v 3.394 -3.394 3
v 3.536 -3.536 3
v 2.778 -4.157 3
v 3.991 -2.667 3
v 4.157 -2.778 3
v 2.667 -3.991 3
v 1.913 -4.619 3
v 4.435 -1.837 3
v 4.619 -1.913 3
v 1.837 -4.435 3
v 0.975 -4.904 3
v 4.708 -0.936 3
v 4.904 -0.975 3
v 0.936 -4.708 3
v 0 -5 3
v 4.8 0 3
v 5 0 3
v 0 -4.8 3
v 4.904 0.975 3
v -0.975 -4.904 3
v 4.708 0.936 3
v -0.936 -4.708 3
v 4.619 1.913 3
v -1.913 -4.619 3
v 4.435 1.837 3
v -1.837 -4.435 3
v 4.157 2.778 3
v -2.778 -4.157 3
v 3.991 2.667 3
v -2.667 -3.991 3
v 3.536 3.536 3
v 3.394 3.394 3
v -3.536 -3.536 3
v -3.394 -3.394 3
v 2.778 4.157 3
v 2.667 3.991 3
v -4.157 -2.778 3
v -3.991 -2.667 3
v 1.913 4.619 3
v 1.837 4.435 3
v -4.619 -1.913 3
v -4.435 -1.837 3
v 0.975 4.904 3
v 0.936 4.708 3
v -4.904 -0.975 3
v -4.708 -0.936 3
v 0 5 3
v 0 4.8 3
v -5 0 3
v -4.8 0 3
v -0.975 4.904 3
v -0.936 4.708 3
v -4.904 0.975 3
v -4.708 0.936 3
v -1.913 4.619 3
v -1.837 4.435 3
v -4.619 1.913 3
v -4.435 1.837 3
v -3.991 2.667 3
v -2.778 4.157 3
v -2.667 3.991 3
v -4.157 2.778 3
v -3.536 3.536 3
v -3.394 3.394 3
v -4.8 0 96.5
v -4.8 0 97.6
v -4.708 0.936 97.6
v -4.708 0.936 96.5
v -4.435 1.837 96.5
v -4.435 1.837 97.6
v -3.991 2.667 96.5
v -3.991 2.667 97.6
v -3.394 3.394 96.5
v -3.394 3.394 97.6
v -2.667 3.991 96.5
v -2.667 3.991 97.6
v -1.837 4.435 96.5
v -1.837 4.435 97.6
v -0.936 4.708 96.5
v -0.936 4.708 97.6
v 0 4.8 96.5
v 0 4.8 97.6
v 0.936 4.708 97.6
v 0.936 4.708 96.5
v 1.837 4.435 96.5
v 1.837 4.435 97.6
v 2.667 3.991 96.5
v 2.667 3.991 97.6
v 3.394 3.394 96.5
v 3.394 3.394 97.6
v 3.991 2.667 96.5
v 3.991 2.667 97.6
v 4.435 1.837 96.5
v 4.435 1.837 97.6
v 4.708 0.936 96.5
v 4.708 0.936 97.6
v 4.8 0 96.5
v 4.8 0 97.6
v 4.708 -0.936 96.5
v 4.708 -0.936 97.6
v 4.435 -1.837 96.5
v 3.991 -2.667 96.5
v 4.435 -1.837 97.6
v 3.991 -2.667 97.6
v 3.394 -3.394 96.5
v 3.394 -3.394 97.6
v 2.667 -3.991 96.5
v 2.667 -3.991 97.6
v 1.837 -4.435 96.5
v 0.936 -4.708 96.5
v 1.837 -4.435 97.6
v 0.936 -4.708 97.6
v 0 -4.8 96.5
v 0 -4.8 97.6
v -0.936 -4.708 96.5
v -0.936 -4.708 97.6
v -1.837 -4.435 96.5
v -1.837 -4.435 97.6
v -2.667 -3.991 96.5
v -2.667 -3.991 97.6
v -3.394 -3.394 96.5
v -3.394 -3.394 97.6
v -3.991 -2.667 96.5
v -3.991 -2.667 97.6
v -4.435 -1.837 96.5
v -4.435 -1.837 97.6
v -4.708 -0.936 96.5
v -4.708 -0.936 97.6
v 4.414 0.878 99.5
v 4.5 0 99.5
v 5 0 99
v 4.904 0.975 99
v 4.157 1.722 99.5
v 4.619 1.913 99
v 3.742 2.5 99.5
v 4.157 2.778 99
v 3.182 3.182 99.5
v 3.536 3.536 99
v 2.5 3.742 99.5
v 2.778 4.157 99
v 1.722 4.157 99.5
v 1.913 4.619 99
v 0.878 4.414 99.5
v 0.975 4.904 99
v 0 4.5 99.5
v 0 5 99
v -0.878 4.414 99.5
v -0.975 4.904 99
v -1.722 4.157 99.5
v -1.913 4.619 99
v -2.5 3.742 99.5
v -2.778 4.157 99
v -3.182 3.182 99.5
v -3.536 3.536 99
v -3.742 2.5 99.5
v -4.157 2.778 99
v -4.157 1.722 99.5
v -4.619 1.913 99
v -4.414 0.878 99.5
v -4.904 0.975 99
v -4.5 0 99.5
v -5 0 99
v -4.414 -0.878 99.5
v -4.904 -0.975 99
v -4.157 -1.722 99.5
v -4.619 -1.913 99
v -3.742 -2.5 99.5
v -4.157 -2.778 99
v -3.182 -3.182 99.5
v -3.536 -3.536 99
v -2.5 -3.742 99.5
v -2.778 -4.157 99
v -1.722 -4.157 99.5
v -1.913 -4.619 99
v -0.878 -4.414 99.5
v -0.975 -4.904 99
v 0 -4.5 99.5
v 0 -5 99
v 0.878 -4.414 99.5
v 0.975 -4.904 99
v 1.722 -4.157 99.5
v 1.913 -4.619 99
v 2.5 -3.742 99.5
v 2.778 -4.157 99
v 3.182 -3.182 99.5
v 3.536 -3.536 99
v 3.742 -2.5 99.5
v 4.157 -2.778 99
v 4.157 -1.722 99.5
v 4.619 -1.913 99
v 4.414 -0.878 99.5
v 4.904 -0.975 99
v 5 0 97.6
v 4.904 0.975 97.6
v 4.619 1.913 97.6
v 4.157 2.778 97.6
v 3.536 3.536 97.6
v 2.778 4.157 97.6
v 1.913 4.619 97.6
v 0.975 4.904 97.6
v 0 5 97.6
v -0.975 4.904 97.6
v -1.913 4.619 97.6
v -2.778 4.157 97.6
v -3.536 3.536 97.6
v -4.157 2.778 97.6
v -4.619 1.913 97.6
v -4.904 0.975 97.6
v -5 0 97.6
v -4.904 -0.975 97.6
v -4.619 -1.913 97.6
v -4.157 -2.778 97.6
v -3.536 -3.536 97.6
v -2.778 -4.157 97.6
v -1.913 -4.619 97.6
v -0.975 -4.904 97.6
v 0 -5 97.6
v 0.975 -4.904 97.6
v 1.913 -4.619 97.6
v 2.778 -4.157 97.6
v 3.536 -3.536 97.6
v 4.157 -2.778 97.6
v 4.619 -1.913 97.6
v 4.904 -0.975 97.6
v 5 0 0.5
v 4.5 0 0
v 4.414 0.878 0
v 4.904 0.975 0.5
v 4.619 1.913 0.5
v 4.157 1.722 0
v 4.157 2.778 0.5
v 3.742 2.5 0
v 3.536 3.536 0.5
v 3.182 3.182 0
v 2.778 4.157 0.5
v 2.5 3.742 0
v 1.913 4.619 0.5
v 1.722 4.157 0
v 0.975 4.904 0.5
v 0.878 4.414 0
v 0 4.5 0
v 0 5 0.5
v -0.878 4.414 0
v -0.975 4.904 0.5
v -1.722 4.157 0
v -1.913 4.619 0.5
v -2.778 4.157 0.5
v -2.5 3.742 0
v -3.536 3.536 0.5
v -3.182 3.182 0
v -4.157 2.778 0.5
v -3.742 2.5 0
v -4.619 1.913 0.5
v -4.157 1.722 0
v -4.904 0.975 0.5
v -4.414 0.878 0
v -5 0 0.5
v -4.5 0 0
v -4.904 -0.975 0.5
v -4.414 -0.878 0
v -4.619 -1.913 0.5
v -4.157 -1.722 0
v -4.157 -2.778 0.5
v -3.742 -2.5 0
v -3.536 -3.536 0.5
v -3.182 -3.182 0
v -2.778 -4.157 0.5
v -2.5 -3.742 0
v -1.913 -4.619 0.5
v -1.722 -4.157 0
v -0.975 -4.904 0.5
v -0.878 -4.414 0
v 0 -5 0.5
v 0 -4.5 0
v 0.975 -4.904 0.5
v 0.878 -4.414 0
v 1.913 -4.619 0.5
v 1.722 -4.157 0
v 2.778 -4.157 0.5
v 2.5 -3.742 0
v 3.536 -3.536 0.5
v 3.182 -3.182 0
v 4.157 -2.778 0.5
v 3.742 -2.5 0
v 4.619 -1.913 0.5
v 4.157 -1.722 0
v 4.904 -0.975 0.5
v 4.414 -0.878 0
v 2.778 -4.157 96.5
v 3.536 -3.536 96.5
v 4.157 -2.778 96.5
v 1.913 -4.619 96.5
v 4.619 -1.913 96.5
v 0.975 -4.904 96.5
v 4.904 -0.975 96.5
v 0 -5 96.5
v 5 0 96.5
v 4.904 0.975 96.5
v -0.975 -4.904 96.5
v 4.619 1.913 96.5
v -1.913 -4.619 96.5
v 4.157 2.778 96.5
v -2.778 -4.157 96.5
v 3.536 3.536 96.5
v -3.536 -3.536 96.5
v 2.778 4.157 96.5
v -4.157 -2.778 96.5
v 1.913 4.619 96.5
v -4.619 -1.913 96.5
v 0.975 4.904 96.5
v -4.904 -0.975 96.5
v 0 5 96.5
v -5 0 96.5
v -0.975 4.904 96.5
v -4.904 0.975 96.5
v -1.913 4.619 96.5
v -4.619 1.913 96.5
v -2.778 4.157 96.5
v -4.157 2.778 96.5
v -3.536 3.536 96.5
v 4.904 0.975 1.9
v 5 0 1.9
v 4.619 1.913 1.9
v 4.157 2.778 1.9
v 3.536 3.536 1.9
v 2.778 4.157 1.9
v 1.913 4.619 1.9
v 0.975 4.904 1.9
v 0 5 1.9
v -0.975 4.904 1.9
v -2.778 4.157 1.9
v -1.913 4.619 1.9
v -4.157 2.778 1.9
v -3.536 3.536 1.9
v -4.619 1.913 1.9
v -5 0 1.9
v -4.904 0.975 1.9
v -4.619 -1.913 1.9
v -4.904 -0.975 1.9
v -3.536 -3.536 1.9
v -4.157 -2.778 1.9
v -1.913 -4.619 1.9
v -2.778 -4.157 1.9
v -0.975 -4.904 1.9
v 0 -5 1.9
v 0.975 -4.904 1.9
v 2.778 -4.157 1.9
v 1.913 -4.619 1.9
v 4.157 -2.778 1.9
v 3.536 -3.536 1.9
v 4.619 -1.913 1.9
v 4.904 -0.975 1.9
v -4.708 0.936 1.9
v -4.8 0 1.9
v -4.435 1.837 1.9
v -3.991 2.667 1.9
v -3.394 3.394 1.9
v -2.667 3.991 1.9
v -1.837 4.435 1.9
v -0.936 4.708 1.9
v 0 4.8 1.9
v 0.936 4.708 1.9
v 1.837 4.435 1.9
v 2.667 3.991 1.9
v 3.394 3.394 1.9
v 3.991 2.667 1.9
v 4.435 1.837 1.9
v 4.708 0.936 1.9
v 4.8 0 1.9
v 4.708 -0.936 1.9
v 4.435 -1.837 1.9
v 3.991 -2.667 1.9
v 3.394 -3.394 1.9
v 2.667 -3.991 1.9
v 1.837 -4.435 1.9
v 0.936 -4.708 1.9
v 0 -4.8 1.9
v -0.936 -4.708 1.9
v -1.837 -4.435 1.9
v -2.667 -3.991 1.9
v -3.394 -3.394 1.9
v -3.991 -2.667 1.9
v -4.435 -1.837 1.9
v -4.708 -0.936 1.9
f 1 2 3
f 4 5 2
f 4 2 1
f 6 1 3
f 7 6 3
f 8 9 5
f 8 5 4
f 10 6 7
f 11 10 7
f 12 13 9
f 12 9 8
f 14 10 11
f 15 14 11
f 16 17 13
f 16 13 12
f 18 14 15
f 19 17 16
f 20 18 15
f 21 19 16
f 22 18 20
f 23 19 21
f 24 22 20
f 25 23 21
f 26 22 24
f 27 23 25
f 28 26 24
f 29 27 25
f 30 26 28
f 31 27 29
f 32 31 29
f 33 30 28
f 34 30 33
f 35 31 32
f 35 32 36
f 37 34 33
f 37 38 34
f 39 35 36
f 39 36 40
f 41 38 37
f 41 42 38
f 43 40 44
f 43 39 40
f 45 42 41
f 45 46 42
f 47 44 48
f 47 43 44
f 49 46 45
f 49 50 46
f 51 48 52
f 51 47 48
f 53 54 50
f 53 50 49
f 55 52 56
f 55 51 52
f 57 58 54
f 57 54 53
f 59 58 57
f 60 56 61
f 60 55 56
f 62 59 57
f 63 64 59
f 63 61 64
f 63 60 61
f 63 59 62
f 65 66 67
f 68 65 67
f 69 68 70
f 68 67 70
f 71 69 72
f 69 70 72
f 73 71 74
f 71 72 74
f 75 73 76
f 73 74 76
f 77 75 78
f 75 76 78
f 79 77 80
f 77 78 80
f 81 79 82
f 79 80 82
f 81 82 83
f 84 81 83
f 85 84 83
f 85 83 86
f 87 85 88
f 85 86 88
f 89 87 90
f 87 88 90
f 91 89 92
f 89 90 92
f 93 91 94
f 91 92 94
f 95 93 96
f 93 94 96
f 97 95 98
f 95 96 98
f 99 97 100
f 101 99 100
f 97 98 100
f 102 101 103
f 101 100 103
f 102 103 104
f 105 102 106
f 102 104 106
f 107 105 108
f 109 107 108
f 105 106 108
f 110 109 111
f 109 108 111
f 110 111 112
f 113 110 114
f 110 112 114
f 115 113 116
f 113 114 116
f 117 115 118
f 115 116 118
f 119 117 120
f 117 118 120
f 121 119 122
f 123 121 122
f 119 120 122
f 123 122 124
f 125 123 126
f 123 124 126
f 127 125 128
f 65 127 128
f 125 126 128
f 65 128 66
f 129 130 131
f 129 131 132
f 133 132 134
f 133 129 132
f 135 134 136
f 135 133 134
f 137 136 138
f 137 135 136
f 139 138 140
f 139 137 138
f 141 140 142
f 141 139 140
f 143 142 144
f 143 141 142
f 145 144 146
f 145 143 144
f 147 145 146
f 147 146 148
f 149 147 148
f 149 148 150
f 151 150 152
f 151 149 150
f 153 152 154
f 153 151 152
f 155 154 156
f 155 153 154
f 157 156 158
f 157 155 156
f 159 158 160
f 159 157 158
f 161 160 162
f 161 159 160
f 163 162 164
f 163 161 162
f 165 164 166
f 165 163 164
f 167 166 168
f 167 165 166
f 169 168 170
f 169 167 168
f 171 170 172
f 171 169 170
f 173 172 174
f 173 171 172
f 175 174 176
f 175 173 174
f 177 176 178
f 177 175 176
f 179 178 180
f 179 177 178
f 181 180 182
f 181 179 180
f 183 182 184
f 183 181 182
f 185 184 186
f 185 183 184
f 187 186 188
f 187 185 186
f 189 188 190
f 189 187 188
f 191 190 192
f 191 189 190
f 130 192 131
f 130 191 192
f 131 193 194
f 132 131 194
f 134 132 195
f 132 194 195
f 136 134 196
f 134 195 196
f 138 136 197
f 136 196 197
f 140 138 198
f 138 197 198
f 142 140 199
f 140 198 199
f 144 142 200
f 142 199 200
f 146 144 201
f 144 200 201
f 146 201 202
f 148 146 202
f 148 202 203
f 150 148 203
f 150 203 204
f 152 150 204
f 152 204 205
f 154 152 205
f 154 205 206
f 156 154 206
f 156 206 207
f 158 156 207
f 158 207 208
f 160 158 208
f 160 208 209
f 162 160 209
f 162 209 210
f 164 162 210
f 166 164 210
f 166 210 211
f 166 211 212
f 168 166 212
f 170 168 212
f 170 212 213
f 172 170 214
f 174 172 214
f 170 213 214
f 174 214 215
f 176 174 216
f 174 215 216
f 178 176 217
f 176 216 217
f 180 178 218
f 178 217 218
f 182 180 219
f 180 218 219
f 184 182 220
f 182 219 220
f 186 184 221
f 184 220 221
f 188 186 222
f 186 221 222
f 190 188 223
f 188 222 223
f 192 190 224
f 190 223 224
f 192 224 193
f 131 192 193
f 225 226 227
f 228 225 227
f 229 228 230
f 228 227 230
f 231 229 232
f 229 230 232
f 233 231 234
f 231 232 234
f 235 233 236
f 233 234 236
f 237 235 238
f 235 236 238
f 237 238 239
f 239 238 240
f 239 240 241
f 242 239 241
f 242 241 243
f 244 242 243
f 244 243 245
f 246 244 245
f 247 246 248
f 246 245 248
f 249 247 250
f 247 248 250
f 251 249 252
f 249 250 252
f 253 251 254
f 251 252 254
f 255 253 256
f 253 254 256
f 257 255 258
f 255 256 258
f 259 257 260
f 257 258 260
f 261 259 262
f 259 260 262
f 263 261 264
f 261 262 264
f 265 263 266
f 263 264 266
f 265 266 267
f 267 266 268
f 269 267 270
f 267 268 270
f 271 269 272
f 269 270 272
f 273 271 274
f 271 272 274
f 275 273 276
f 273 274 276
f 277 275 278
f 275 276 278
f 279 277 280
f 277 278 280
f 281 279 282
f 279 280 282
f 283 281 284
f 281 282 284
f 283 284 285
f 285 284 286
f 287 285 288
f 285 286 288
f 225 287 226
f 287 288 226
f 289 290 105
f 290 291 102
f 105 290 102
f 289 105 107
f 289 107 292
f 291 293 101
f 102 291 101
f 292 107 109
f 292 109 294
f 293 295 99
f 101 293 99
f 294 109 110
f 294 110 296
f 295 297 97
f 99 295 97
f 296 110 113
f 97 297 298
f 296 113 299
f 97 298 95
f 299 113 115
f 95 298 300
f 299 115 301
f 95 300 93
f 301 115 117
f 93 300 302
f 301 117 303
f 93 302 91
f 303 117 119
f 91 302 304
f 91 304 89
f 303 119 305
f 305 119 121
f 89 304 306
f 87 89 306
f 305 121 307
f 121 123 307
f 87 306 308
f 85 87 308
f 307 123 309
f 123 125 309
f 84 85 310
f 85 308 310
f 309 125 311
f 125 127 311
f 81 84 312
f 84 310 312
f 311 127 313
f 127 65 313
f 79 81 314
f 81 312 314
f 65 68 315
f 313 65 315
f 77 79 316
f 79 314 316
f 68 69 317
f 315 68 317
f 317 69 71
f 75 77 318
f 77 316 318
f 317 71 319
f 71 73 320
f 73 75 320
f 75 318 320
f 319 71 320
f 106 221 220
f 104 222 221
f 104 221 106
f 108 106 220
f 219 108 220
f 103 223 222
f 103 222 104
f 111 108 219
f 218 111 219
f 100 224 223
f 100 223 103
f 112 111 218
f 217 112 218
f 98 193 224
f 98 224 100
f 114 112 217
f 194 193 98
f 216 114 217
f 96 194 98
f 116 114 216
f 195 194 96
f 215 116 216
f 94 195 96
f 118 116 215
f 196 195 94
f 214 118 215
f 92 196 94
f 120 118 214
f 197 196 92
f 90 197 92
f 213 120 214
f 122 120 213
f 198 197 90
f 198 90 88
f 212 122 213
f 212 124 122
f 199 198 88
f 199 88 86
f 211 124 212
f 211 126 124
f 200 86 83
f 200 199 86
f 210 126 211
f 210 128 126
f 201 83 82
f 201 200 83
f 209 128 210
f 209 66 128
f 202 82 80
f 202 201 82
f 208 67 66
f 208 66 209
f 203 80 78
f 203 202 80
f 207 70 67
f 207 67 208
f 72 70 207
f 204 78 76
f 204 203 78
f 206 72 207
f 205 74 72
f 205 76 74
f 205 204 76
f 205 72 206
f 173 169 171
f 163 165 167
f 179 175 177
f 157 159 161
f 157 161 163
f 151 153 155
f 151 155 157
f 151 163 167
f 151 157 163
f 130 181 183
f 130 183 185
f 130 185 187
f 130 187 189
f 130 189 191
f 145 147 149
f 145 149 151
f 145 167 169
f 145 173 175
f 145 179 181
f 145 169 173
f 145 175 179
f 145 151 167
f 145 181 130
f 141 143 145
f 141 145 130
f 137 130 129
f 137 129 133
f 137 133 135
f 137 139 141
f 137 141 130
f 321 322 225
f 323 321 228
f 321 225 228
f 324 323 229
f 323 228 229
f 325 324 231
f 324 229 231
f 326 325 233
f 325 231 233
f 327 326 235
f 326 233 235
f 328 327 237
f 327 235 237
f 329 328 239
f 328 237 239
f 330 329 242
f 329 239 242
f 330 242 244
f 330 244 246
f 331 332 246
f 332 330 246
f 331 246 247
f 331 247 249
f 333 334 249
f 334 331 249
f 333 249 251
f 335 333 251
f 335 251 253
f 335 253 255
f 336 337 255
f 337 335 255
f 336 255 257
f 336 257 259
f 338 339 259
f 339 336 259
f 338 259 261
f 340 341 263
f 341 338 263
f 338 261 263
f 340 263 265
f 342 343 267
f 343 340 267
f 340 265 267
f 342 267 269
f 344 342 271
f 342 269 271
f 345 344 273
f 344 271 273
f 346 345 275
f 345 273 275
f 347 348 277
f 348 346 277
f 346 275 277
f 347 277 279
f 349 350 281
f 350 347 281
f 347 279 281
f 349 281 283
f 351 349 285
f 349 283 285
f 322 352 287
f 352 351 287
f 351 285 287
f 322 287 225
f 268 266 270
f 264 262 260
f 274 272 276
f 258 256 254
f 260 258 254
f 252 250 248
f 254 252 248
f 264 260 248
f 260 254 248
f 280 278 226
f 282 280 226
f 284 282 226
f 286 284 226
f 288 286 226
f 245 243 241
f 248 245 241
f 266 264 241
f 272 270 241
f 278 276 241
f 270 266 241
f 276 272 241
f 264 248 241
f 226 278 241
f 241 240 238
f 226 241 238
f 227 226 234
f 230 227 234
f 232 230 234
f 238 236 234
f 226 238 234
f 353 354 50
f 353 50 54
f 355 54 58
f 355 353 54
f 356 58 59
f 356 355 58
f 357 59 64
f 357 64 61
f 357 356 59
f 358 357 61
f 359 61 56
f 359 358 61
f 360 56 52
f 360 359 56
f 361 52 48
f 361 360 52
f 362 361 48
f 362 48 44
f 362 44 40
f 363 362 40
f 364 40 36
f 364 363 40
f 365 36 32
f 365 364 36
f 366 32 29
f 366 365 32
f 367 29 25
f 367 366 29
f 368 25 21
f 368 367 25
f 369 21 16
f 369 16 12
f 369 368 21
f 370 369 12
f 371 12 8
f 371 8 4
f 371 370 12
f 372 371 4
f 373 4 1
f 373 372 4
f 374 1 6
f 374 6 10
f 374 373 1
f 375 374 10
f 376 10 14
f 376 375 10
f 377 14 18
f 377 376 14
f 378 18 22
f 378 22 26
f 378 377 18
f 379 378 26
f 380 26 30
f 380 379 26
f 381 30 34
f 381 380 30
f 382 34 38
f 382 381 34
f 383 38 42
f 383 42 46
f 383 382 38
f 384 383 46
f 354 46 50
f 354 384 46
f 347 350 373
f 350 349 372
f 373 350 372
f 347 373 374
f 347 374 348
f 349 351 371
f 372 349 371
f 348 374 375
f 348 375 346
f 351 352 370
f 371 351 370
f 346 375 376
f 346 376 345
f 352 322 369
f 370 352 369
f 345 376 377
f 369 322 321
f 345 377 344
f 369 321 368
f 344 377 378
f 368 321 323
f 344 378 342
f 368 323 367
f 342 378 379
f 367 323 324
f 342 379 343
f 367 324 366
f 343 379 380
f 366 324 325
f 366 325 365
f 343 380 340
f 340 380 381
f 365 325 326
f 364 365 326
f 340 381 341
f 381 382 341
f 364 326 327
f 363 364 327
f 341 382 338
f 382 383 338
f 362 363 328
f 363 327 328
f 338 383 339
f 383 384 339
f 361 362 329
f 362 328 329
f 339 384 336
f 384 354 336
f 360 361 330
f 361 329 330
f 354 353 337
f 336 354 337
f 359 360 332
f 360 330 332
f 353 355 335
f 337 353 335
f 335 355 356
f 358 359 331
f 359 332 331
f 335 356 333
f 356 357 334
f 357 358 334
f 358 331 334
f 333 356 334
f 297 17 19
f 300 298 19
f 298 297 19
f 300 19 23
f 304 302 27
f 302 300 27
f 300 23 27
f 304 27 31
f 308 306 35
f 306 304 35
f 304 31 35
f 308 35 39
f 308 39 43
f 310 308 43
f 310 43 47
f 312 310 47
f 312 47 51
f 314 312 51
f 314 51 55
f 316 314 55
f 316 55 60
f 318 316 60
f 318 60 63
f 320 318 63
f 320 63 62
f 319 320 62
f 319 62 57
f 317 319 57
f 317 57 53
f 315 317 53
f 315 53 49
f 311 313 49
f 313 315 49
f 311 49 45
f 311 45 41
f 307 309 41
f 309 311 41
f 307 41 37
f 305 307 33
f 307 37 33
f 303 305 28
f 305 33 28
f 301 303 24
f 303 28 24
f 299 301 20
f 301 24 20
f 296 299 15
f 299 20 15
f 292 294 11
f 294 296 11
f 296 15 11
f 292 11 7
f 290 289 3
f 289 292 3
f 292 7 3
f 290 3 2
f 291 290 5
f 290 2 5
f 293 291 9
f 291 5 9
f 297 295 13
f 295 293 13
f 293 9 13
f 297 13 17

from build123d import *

# Parameters (mm, degrees)
SKETCH_1_R          = 5
EXTRUDE_1_DEPTH     = 99.5
CHAMFER_1_SIZE      = 0.5
CUT_EXTRUDE_START   = -1.9
SKETCH_2_R          = 5
SKETCH_2_R_2        = 4.8
CUT_EXTRUDE_1_DEPTH = 1.1


with BuildPart() as part:
    # 草图1 → 凸台-拉伸1 (new body)
    with BuildSketch(Plane.XY):
        Circle(SKETCH_1_R)
    extrude(amount=EXTRUDE_1_DEPTH)

    # 倒角1
    chamfer_1_edges = [part.edges().sort_by_distance(p)[0] for p in [
        (-5, 0, 0),
        (-5, 0, 99.5),
    ]]
    chamfer(chamfer_1_edges, length=CHAMFER_1_SIZE)

    # 草图2 → 切除-拉伸1 (cut)
    with BuildSketch(Plane(origin=(0, 0, 0), x_dir=(-1, 0, 0), z_dir=(0, 0, -1)).offset(CUT_EXTRUDE_START)):
        Circle(SKETCH_2_R)
        Circle(SKETCH_2_R_2, mode=Mode.SUBTRACT)
    cut_extrude_1 = extrude(amount=-CUT_EXTRUDE_1_DEPTH, mode=Mode.SUBTRACT)

    # 镜向1: 切除-拉伸1 across plane
    add(cut_extrude_1.mirror(Plane.XY.offset(49.75)), mode=Mode.SUBTRACT)


solid = part.part
